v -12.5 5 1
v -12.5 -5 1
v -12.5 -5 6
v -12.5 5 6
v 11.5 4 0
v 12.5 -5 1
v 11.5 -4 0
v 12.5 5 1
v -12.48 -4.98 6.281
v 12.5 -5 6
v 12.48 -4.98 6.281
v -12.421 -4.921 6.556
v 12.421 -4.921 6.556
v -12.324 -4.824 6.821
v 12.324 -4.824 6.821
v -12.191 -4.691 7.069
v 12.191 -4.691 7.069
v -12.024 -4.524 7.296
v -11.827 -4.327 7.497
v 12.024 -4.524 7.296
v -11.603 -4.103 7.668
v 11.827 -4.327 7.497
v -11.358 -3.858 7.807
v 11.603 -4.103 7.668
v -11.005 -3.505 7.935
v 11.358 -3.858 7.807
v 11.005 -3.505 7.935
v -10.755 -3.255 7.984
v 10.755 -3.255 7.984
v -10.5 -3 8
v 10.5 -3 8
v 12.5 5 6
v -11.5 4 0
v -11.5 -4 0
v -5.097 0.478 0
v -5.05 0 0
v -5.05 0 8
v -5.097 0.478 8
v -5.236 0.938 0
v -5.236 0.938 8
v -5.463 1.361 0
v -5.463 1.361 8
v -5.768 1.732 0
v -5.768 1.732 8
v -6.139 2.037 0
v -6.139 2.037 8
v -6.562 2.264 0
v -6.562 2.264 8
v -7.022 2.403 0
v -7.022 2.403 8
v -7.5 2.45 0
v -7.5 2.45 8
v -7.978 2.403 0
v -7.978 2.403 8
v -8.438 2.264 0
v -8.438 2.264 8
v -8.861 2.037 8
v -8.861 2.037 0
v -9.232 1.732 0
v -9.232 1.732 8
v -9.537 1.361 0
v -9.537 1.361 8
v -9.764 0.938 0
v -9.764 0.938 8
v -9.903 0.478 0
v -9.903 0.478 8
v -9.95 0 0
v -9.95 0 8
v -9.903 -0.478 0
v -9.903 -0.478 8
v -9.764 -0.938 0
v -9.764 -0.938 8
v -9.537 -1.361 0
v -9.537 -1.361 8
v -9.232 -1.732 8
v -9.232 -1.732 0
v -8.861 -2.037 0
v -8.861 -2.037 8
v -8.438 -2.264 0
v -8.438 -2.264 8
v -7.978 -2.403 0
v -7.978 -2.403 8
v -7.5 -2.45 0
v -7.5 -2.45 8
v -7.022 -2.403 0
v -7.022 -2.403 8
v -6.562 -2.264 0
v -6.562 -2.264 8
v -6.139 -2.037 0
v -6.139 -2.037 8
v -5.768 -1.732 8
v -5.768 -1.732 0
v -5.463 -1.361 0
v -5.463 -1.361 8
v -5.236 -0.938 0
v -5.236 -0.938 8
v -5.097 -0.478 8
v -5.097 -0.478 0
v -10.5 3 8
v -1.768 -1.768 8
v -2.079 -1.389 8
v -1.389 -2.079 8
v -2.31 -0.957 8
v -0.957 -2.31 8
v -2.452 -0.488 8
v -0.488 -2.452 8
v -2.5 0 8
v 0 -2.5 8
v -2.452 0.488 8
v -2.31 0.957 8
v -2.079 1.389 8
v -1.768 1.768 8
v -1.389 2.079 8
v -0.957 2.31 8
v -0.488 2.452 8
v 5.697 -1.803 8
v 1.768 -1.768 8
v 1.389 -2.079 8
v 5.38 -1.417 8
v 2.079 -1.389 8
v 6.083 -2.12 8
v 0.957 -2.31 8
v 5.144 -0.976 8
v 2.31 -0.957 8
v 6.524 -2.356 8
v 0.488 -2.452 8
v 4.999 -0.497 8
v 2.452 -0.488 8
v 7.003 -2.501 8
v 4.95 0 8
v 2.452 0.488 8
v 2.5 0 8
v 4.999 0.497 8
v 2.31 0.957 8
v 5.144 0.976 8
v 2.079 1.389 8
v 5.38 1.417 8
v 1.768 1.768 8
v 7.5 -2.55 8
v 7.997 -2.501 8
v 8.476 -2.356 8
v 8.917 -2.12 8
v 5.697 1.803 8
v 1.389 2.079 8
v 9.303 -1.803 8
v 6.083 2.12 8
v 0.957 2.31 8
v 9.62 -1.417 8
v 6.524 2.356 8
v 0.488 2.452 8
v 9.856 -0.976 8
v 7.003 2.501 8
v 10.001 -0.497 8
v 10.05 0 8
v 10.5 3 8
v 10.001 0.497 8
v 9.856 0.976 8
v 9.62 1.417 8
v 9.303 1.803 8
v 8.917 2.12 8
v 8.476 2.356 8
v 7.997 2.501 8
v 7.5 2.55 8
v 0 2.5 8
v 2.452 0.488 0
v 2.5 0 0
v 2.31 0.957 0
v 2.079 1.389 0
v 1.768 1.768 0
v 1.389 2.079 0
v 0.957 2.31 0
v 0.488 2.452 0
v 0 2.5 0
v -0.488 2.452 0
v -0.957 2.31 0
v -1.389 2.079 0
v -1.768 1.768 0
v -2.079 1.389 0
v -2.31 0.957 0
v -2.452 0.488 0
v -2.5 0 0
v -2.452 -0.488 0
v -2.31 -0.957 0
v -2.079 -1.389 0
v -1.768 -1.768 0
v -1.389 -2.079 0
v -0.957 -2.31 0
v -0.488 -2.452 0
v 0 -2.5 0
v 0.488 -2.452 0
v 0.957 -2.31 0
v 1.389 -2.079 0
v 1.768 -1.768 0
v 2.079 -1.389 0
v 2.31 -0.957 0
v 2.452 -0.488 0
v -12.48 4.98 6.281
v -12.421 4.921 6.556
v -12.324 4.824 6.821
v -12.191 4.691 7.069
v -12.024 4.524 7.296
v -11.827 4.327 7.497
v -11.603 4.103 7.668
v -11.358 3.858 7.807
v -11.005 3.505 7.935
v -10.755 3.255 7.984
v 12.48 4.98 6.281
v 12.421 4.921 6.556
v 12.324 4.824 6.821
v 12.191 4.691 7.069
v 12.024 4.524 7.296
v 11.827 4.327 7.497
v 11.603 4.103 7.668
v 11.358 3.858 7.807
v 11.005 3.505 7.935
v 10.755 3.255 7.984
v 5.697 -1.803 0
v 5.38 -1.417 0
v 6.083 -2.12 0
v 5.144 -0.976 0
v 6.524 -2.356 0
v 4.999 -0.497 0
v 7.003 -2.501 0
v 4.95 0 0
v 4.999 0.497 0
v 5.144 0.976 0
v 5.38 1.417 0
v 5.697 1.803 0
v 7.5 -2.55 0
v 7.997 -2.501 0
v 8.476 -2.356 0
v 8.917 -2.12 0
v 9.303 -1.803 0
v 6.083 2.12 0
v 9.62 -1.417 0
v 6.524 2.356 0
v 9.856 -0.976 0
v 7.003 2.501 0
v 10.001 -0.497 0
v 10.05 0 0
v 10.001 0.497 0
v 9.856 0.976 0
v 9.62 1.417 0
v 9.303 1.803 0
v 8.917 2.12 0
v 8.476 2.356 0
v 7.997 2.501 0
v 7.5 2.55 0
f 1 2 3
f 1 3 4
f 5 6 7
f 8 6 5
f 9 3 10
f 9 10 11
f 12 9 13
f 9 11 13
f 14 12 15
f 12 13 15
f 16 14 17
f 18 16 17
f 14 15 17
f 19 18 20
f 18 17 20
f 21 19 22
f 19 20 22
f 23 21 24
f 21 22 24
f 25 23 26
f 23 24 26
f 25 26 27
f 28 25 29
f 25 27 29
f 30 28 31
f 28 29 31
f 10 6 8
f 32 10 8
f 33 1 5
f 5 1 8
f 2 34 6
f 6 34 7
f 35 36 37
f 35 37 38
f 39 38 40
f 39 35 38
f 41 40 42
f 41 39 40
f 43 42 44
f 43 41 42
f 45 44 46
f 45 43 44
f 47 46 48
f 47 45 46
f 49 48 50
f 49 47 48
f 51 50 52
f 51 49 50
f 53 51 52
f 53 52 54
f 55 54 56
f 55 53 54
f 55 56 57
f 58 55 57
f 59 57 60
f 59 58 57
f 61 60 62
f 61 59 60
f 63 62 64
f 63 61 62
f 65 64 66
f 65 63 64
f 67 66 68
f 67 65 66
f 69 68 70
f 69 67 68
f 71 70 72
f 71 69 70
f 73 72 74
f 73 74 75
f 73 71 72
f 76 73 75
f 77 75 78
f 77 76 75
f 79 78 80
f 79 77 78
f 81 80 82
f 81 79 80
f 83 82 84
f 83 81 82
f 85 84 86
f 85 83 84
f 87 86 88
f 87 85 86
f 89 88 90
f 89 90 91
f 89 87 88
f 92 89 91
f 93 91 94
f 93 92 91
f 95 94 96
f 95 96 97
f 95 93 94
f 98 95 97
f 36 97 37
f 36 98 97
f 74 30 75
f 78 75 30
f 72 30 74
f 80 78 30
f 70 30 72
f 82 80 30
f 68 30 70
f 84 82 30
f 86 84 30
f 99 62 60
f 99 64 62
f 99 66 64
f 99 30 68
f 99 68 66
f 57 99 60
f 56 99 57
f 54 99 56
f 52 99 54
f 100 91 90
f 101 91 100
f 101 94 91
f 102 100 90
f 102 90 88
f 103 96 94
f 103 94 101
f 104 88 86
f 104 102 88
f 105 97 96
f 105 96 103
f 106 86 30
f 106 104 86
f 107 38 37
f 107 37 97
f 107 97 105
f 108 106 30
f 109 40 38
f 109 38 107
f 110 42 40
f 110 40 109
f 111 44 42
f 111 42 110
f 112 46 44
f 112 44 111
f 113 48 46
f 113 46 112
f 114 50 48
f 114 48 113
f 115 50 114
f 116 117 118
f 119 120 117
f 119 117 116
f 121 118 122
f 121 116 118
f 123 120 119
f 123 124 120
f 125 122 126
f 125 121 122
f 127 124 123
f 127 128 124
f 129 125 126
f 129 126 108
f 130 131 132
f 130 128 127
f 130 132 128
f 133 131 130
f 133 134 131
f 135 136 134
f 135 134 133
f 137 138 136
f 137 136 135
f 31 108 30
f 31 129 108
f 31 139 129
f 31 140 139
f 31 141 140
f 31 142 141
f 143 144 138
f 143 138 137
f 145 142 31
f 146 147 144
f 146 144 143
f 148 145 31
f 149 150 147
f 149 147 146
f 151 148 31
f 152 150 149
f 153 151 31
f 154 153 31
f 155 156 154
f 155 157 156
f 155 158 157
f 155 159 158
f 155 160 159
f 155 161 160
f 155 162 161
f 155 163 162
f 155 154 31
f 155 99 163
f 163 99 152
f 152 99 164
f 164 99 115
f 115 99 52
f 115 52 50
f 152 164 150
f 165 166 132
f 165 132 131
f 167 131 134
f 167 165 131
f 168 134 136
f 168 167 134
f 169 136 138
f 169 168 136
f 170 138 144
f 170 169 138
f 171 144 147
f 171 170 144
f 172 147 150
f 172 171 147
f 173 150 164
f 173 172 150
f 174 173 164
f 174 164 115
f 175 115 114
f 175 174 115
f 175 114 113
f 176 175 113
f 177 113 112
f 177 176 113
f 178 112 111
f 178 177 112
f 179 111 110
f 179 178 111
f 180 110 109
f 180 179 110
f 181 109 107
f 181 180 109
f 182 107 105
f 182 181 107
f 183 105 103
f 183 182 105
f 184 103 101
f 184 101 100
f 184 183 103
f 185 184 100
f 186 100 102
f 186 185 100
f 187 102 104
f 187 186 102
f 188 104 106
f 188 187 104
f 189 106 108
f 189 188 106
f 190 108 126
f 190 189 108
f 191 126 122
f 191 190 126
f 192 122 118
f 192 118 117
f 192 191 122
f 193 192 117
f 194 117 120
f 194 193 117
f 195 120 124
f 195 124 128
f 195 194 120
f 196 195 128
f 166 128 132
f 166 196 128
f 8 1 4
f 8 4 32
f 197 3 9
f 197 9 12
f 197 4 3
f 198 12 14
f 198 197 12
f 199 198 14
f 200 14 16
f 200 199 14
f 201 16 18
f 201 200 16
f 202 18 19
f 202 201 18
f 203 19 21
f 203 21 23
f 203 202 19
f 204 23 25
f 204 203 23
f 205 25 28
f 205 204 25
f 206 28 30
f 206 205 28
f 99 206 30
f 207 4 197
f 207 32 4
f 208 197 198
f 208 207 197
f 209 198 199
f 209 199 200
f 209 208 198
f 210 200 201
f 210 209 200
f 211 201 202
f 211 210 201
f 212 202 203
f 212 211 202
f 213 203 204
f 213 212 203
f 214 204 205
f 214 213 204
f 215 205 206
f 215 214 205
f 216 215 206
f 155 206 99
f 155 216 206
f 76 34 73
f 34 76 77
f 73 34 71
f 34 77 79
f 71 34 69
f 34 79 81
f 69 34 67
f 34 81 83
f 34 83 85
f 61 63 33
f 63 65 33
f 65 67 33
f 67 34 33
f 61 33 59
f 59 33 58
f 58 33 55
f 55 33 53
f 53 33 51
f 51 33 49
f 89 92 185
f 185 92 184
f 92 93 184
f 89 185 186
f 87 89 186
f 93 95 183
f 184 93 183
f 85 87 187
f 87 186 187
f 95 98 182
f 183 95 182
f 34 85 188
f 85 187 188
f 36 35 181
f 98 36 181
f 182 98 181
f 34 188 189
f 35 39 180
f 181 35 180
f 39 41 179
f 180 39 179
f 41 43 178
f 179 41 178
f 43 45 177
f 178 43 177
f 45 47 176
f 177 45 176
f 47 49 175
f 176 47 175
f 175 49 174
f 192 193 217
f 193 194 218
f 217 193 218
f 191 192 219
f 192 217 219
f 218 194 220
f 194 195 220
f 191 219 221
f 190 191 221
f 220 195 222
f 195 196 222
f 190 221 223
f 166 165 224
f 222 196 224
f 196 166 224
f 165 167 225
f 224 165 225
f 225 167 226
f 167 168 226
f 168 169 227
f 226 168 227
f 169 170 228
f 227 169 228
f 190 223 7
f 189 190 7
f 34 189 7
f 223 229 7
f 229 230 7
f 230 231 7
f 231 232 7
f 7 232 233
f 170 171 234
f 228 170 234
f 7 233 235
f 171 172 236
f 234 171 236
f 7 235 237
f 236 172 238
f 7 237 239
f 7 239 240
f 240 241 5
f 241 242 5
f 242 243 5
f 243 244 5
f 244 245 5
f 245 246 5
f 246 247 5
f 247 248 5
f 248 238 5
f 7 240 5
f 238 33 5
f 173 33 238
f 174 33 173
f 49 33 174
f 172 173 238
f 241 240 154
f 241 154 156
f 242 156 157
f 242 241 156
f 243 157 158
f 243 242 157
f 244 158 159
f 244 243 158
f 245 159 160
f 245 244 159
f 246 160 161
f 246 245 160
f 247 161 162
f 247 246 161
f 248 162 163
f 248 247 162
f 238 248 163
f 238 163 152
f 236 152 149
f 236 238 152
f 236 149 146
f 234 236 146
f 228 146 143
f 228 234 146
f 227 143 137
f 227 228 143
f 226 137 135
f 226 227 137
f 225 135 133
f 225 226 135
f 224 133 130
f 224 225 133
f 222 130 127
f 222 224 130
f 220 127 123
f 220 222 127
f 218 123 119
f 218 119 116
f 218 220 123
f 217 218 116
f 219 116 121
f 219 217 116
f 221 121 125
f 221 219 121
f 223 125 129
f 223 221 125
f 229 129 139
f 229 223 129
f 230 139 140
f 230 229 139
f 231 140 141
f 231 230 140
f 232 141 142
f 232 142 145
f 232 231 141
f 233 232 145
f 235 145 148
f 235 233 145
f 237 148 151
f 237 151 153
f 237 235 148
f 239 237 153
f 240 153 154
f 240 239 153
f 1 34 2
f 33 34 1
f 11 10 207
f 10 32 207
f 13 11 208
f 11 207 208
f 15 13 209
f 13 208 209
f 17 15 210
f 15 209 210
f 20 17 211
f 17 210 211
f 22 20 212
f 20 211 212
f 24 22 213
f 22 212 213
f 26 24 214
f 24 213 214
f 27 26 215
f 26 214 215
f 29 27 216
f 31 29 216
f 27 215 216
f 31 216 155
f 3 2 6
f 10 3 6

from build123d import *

# Parameters (mm, degrees)
F0_W     = 25
F0_H     = 10
F0_R     = 2.45
F0_R_2   = 2.5
F0_R_3   = 2.55
F1_DEPTH = 8
F2_R     = 2
F3_SIZE  = 1


with BuildPart() as f1:
    # F0 (on Top) → F1 (new body)
    with BuildSketch(Plane.XY):
        Rectangle(F0_W, F0_H)
        with Locations((-7.5, 0)):
            Circle(F0_R, mode=Mode.SUBTRACT)
        Circle(F0_R_2, mode=Mode.SUBTRACT)
        with Locations((7.5, 0)):
            Circle(F0_R_3, mode=Mode.SUBTRACT)
    extrude(amount=F1_DEPTH)

    # F2
    f2_edges = [f1.edges().sort_by_distance(p)[0] for p in [
        (0, -5, 8),
        (-12.5, 0, 8),
        (0, 5, 8),
        (12.5, 0, 8),
    ]]
    fillet(f2_edges, radius=F2_R)

    # F3
    f3_edges = [f1.edges().sort_by_distance(p)[0] for p in [
        (-12.5, 0, 0),
        (0, -5, 0),
        (0, 5, 0),
        (12.5, 0, 0),
    ]]
    chamfer(f3_edges, length=F3_SIZE)


solid = f1.part
